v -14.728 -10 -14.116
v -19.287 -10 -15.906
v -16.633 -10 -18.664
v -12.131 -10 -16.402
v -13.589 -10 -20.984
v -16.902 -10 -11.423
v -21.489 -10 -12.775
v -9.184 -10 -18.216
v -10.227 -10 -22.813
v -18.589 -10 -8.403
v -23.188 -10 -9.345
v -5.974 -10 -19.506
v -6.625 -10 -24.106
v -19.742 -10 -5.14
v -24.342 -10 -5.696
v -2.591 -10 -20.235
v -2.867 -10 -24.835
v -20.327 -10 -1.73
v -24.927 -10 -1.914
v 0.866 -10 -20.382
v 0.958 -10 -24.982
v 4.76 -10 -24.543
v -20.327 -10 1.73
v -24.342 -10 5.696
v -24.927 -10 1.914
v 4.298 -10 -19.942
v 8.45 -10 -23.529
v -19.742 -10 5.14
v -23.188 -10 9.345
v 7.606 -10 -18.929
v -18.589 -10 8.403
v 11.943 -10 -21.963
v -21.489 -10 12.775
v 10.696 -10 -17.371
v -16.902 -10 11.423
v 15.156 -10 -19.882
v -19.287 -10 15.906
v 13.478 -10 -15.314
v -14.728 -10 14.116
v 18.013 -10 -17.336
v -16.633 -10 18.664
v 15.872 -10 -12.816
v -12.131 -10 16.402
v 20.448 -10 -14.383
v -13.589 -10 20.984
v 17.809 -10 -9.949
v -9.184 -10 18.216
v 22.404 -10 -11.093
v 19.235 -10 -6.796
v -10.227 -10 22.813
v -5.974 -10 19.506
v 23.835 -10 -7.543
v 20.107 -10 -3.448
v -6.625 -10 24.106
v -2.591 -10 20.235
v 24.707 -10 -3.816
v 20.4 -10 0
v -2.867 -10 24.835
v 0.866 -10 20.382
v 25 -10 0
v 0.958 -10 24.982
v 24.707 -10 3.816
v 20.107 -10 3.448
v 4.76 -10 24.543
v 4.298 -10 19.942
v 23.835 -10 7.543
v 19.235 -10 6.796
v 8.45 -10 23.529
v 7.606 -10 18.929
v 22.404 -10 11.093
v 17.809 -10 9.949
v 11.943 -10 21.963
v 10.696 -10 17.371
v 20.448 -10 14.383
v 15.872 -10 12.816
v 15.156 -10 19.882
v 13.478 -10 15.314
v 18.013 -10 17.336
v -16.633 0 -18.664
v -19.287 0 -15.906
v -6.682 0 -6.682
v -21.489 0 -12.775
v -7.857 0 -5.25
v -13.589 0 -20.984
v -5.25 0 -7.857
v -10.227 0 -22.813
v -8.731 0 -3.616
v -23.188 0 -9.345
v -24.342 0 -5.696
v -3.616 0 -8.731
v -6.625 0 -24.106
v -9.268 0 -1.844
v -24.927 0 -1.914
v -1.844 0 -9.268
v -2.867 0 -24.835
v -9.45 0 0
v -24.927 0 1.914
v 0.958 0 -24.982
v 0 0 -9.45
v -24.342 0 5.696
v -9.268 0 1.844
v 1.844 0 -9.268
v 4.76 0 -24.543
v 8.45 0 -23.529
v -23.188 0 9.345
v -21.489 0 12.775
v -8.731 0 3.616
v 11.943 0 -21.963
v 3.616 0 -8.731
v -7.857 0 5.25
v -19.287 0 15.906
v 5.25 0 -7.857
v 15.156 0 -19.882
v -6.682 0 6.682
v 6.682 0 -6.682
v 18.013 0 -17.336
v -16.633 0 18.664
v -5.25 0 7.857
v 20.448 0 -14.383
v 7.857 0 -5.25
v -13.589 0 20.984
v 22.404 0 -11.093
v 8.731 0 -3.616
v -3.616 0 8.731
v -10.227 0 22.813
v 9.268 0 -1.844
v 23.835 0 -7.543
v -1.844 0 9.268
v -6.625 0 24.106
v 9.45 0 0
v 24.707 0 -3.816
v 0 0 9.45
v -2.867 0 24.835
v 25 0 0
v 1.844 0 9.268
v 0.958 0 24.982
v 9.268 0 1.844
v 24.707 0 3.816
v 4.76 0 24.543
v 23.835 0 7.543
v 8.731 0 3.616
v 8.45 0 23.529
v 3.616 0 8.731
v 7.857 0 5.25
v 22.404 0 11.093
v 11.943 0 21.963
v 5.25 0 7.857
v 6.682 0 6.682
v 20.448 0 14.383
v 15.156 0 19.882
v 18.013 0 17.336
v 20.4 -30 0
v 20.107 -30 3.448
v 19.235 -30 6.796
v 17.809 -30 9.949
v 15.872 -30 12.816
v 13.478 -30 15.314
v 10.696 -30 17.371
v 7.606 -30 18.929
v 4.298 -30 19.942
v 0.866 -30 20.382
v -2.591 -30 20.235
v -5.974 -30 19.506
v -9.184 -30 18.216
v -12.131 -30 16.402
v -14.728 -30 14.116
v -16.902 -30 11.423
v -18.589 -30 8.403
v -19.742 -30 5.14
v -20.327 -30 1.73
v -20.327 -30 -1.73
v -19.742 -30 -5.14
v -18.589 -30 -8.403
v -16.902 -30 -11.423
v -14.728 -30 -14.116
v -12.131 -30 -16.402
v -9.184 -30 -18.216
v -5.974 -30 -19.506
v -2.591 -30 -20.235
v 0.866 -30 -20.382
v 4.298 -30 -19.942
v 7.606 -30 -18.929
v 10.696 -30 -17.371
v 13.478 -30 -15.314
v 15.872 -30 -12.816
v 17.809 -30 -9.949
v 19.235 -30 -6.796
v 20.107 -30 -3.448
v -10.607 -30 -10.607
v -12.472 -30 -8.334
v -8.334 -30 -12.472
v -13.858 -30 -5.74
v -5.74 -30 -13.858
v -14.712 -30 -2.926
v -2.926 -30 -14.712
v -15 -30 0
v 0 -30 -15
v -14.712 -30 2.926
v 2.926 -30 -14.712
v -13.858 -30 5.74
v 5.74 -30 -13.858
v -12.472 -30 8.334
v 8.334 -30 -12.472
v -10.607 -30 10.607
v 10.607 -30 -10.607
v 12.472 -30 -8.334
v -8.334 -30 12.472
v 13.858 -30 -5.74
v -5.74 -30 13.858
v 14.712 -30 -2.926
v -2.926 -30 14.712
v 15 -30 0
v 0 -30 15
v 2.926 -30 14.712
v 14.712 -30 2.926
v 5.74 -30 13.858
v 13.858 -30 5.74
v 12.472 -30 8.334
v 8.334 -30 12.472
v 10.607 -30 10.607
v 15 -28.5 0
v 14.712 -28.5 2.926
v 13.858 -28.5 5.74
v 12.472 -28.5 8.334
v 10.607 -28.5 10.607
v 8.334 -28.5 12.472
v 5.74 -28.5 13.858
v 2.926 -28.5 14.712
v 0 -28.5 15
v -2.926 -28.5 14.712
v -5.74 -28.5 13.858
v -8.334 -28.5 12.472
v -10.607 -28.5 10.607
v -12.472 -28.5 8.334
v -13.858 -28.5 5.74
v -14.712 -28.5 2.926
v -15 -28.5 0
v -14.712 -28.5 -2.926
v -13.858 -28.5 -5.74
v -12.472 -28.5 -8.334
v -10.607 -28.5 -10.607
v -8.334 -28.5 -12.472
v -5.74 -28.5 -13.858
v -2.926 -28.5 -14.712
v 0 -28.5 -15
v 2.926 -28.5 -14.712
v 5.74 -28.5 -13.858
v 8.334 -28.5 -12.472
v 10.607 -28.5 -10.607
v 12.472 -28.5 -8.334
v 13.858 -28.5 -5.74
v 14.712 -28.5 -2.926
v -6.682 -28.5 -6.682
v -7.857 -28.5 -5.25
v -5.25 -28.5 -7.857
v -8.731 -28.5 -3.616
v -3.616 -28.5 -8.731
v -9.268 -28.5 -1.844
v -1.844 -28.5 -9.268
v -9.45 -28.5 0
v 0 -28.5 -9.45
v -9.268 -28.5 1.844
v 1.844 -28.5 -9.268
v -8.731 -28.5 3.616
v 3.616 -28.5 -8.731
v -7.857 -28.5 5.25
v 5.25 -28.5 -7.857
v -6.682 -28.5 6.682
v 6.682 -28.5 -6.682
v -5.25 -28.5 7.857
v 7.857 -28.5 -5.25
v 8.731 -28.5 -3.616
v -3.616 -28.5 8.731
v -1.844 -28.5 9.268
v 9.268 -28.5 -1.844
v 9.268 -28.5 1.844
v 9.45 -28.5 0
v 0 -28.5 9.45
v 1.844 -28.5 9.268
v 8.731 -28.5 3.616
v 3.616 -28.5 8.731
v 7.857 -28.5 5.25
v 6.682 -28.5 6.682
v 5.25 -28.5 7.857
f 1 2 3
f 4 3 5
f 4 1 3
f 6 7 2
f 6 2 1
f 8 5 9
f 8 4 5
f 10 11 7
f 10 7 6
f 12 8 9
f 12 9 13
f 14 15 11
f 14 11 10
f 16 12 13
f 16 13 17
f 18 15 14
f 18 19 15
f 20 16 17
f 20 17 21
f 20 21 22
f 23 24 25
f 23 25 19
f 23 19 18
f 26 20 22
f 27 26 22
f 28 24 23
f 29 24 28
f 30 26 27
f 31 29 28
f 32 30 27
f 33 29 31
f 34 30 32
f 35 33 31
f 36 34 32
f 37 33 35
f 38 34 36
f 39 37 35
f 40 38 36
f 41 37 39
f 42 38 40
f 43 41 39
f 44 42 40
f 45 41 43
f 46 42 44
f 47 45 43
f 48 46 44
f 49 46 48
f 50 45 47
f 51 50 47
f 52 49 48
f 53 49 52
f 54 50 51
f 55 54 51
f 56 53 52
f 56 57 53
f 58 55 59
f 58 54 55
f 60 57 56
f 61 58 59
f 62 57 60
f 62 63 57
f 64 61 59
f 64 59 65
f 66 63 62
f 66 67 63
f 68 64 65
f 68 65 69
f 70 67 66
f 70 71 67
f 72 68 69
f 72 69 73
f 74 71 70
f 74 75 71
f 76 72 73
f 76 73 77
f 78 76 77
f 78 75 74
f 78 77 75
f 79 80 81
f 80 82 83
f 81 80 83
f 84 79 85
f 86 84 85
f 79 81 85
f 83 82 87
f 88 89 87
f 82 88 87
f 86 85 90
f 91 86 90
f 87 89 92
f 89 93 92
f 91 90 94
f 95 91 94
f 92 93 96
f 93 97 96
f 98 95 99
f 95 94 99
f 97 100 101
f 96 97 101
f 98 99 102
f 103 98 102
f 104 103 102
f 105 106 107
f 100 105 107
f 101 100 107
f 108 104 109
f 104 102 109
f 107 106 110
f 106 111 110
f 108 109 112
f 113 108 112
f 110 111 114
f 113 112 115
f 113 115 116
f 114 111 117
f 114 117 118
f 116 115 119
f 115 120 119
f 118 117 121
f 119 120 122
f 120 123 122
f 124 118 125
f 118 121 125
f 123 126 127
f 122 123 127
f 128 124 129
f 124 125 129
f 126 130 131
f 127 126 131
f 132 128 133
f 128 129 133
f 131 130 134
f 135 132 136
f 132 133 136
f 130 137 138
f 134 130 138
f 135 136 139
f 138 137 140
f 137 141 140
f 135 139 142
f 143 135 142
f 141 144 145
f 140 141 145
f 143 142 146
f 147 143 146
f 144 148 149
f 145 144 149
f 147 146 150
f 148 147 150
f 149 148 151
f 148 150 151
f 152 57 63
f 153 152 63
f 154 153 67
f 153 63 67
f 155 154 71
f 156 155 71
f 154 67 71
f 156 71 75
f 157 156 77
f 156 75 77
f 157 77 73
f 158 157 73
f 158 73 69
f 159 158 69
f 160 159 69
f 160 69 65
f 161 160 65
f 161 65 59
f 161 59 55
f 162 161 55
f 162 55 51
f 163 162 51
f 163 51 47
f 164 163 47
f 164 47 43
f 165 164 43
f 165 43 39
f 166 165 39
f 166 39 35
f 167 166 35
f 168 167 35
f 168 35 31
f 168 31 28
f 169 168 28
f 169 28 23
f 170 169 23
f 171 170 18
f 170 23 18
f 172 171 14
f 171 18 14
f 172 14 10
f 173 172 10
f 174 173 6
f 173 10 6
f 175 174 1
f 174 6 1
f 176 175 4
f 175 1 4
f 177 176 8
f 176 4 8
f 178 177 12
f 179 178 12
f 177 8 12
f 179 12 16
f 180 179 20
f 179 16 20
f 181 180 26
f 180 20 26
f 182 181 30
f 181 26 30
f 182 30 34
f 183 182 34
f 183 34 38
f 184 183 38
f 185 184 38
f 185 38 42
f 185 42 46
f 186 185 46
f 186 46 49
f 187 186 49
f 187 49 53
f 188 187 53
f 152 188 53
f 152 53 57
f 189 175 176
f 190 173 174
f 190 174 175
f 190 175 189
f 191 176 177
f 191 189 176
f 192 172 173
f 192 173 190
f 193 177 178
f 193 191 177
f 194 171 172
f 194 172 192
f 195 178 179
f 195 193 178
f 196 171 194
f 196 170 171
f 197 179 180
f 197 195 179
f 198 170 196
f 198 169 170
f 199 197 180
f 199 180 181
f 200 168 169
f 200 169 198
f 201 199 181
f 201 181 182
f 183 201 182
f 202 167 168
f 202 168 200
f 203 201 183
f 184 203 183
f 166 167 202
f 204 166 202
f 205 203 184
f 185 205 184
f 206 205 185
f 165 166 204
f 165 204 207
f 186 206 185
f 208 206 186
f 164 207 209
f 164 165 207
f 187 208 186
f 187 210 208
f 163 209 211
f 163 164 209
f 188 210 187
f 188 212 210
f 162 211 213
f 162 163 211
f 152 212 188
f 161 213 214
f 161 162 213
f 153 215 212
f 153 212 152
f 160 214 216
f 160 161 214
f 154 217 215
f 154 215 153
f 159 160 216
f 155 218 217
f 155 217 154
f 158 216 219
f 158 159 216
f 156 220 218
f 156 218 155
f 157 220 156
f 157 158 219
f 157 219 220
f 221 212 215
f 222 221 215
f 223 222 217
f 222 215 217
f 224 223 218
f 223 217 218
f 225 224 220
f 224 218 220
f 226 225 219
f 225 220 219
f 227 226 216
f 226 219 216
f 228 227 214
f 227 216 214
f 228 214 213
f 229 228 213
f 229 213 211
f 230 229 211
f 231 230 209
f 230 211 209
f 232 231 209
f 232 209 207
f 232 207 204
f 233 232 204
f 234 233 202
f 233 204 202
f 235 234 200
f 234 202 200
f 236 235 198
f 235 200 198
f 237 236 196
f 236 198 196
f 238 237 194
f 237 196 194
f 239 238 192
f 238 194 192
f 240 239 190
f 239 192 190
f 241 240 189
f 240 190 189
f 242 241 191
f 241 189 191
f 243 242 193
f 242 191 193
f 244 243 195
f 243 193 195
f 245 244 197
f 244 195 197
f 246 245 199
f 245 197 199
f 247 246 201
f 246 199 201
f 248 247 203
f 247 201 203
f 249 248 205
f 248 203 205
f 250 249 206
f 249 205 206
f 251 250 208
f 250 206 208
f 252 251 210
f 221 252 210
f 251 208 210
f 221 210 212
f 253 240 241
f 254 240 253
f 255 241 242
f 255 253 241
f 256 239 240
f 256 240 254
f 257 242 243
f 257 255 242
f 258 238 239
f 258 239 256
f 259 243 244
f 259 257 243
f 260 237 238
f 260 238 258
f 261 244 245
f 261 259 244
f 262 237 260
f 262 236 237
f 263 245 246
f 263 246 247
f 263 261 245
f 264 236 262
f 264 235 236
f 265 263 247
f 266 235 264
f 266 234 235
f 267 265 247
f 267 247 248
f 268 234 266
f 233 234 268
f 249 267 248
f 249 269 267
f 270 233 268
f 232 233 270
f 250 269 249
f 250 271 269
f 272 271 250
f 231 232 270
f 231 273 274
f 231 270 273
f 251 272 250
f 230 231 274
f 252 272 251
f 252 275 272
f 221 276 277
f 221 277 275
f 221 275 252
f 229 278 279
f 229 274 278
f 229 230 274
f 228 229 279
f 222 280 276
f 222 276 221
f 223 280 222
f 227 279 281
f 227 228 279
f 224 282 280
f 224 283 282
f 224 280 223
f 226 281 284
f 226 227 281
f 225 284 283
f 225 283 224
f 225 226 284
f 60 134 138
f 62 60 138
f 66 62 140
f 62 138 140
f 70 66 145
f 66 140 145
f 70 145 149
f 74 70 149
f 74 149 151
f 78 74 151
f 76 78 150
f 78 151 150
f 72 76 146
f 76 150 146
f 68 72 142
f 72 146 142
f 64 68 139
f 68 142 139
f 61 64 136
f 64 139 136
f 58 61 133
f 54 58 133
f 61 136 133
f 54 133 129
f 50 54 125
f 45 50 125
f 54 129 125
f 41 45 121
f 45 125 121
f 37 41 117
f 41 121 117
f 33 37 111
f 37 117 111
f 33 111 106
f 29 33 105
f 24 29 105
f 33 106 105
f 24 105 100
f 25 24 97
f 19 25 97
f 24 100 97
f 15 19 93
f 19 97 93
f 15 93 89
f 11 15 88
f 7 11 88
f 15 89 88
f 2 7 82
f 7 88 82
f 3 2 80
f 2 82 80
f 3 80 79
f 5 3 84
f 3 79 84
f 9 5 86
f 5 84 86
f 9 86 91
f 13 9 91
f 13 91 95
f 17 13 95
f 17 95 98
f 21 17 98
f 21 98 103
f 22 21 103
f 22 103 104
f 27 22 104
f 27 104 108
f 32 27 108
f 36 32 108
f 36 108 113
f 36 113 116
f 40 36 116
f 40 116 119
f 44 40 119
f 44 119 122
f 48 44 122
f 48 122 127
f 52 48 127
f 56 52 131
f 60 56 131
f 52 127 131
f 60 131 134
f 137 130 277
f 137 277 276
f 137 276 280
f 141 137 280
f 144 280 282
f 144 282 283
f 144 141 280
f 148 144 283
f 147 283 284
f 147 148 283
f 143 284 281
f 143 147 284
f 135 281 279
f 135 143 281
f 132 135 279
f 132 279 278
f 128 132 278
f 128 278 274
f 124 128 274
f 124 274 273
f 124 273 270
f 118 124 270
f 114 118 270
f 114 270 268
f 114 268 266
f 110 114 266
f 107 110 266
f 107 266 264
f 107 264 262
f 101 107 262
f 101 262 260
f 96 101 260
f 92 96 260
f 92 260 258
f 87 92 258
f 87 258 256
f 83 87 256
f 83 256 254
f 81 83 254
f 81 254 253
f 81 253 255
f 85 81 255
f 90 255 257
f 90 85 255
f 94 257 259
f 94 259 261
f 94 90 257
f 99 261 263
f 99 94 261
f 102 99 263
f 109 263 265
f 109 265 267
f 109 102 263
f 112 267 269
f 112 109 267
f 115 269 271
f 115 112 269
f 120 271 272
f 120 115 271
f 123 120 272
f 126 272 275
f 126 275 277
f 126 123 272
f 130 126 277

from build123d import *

# Parameters (mm, degrees)
F0_R     = 20.4
F0_R_2   = 9.45
F1_DEPTH = 30
F0_R_3   = 25
F2_DEPTH = 10
F3_R     = 15
F3_R_2   = 9.45
F4_DEPTH = 1.5


with BuildPart() as f1:
    # F0 (on Front) → F1 (new body)
    with BuildSketch(Plane.XZ):
        Circle(F0_R)
        Circle(F0_R_2, mode=Mode.SUBTRACT)
    extrude(amount=F1_DEPTH)

    # F0 (on Front) → F2 (join)
    with BuildSketch(Plane.XZ):
        Circle(F0_R_3)
        Circle(F0_R, mode=Mode.SUBTRACT)
    extrude(amount=F2_DEPTH)

    # F3 (on face) → F4 (cut)
    with BuildSketch(Plane.XZ.offset(30)):
        Circle(F3_R)
        Circle(F3_R_2, mode=Mode.SUBTRACT)
    extrude(amount=-F4_DEPTH, mode=Mode.SUBTRACT)


solid = f1.part
